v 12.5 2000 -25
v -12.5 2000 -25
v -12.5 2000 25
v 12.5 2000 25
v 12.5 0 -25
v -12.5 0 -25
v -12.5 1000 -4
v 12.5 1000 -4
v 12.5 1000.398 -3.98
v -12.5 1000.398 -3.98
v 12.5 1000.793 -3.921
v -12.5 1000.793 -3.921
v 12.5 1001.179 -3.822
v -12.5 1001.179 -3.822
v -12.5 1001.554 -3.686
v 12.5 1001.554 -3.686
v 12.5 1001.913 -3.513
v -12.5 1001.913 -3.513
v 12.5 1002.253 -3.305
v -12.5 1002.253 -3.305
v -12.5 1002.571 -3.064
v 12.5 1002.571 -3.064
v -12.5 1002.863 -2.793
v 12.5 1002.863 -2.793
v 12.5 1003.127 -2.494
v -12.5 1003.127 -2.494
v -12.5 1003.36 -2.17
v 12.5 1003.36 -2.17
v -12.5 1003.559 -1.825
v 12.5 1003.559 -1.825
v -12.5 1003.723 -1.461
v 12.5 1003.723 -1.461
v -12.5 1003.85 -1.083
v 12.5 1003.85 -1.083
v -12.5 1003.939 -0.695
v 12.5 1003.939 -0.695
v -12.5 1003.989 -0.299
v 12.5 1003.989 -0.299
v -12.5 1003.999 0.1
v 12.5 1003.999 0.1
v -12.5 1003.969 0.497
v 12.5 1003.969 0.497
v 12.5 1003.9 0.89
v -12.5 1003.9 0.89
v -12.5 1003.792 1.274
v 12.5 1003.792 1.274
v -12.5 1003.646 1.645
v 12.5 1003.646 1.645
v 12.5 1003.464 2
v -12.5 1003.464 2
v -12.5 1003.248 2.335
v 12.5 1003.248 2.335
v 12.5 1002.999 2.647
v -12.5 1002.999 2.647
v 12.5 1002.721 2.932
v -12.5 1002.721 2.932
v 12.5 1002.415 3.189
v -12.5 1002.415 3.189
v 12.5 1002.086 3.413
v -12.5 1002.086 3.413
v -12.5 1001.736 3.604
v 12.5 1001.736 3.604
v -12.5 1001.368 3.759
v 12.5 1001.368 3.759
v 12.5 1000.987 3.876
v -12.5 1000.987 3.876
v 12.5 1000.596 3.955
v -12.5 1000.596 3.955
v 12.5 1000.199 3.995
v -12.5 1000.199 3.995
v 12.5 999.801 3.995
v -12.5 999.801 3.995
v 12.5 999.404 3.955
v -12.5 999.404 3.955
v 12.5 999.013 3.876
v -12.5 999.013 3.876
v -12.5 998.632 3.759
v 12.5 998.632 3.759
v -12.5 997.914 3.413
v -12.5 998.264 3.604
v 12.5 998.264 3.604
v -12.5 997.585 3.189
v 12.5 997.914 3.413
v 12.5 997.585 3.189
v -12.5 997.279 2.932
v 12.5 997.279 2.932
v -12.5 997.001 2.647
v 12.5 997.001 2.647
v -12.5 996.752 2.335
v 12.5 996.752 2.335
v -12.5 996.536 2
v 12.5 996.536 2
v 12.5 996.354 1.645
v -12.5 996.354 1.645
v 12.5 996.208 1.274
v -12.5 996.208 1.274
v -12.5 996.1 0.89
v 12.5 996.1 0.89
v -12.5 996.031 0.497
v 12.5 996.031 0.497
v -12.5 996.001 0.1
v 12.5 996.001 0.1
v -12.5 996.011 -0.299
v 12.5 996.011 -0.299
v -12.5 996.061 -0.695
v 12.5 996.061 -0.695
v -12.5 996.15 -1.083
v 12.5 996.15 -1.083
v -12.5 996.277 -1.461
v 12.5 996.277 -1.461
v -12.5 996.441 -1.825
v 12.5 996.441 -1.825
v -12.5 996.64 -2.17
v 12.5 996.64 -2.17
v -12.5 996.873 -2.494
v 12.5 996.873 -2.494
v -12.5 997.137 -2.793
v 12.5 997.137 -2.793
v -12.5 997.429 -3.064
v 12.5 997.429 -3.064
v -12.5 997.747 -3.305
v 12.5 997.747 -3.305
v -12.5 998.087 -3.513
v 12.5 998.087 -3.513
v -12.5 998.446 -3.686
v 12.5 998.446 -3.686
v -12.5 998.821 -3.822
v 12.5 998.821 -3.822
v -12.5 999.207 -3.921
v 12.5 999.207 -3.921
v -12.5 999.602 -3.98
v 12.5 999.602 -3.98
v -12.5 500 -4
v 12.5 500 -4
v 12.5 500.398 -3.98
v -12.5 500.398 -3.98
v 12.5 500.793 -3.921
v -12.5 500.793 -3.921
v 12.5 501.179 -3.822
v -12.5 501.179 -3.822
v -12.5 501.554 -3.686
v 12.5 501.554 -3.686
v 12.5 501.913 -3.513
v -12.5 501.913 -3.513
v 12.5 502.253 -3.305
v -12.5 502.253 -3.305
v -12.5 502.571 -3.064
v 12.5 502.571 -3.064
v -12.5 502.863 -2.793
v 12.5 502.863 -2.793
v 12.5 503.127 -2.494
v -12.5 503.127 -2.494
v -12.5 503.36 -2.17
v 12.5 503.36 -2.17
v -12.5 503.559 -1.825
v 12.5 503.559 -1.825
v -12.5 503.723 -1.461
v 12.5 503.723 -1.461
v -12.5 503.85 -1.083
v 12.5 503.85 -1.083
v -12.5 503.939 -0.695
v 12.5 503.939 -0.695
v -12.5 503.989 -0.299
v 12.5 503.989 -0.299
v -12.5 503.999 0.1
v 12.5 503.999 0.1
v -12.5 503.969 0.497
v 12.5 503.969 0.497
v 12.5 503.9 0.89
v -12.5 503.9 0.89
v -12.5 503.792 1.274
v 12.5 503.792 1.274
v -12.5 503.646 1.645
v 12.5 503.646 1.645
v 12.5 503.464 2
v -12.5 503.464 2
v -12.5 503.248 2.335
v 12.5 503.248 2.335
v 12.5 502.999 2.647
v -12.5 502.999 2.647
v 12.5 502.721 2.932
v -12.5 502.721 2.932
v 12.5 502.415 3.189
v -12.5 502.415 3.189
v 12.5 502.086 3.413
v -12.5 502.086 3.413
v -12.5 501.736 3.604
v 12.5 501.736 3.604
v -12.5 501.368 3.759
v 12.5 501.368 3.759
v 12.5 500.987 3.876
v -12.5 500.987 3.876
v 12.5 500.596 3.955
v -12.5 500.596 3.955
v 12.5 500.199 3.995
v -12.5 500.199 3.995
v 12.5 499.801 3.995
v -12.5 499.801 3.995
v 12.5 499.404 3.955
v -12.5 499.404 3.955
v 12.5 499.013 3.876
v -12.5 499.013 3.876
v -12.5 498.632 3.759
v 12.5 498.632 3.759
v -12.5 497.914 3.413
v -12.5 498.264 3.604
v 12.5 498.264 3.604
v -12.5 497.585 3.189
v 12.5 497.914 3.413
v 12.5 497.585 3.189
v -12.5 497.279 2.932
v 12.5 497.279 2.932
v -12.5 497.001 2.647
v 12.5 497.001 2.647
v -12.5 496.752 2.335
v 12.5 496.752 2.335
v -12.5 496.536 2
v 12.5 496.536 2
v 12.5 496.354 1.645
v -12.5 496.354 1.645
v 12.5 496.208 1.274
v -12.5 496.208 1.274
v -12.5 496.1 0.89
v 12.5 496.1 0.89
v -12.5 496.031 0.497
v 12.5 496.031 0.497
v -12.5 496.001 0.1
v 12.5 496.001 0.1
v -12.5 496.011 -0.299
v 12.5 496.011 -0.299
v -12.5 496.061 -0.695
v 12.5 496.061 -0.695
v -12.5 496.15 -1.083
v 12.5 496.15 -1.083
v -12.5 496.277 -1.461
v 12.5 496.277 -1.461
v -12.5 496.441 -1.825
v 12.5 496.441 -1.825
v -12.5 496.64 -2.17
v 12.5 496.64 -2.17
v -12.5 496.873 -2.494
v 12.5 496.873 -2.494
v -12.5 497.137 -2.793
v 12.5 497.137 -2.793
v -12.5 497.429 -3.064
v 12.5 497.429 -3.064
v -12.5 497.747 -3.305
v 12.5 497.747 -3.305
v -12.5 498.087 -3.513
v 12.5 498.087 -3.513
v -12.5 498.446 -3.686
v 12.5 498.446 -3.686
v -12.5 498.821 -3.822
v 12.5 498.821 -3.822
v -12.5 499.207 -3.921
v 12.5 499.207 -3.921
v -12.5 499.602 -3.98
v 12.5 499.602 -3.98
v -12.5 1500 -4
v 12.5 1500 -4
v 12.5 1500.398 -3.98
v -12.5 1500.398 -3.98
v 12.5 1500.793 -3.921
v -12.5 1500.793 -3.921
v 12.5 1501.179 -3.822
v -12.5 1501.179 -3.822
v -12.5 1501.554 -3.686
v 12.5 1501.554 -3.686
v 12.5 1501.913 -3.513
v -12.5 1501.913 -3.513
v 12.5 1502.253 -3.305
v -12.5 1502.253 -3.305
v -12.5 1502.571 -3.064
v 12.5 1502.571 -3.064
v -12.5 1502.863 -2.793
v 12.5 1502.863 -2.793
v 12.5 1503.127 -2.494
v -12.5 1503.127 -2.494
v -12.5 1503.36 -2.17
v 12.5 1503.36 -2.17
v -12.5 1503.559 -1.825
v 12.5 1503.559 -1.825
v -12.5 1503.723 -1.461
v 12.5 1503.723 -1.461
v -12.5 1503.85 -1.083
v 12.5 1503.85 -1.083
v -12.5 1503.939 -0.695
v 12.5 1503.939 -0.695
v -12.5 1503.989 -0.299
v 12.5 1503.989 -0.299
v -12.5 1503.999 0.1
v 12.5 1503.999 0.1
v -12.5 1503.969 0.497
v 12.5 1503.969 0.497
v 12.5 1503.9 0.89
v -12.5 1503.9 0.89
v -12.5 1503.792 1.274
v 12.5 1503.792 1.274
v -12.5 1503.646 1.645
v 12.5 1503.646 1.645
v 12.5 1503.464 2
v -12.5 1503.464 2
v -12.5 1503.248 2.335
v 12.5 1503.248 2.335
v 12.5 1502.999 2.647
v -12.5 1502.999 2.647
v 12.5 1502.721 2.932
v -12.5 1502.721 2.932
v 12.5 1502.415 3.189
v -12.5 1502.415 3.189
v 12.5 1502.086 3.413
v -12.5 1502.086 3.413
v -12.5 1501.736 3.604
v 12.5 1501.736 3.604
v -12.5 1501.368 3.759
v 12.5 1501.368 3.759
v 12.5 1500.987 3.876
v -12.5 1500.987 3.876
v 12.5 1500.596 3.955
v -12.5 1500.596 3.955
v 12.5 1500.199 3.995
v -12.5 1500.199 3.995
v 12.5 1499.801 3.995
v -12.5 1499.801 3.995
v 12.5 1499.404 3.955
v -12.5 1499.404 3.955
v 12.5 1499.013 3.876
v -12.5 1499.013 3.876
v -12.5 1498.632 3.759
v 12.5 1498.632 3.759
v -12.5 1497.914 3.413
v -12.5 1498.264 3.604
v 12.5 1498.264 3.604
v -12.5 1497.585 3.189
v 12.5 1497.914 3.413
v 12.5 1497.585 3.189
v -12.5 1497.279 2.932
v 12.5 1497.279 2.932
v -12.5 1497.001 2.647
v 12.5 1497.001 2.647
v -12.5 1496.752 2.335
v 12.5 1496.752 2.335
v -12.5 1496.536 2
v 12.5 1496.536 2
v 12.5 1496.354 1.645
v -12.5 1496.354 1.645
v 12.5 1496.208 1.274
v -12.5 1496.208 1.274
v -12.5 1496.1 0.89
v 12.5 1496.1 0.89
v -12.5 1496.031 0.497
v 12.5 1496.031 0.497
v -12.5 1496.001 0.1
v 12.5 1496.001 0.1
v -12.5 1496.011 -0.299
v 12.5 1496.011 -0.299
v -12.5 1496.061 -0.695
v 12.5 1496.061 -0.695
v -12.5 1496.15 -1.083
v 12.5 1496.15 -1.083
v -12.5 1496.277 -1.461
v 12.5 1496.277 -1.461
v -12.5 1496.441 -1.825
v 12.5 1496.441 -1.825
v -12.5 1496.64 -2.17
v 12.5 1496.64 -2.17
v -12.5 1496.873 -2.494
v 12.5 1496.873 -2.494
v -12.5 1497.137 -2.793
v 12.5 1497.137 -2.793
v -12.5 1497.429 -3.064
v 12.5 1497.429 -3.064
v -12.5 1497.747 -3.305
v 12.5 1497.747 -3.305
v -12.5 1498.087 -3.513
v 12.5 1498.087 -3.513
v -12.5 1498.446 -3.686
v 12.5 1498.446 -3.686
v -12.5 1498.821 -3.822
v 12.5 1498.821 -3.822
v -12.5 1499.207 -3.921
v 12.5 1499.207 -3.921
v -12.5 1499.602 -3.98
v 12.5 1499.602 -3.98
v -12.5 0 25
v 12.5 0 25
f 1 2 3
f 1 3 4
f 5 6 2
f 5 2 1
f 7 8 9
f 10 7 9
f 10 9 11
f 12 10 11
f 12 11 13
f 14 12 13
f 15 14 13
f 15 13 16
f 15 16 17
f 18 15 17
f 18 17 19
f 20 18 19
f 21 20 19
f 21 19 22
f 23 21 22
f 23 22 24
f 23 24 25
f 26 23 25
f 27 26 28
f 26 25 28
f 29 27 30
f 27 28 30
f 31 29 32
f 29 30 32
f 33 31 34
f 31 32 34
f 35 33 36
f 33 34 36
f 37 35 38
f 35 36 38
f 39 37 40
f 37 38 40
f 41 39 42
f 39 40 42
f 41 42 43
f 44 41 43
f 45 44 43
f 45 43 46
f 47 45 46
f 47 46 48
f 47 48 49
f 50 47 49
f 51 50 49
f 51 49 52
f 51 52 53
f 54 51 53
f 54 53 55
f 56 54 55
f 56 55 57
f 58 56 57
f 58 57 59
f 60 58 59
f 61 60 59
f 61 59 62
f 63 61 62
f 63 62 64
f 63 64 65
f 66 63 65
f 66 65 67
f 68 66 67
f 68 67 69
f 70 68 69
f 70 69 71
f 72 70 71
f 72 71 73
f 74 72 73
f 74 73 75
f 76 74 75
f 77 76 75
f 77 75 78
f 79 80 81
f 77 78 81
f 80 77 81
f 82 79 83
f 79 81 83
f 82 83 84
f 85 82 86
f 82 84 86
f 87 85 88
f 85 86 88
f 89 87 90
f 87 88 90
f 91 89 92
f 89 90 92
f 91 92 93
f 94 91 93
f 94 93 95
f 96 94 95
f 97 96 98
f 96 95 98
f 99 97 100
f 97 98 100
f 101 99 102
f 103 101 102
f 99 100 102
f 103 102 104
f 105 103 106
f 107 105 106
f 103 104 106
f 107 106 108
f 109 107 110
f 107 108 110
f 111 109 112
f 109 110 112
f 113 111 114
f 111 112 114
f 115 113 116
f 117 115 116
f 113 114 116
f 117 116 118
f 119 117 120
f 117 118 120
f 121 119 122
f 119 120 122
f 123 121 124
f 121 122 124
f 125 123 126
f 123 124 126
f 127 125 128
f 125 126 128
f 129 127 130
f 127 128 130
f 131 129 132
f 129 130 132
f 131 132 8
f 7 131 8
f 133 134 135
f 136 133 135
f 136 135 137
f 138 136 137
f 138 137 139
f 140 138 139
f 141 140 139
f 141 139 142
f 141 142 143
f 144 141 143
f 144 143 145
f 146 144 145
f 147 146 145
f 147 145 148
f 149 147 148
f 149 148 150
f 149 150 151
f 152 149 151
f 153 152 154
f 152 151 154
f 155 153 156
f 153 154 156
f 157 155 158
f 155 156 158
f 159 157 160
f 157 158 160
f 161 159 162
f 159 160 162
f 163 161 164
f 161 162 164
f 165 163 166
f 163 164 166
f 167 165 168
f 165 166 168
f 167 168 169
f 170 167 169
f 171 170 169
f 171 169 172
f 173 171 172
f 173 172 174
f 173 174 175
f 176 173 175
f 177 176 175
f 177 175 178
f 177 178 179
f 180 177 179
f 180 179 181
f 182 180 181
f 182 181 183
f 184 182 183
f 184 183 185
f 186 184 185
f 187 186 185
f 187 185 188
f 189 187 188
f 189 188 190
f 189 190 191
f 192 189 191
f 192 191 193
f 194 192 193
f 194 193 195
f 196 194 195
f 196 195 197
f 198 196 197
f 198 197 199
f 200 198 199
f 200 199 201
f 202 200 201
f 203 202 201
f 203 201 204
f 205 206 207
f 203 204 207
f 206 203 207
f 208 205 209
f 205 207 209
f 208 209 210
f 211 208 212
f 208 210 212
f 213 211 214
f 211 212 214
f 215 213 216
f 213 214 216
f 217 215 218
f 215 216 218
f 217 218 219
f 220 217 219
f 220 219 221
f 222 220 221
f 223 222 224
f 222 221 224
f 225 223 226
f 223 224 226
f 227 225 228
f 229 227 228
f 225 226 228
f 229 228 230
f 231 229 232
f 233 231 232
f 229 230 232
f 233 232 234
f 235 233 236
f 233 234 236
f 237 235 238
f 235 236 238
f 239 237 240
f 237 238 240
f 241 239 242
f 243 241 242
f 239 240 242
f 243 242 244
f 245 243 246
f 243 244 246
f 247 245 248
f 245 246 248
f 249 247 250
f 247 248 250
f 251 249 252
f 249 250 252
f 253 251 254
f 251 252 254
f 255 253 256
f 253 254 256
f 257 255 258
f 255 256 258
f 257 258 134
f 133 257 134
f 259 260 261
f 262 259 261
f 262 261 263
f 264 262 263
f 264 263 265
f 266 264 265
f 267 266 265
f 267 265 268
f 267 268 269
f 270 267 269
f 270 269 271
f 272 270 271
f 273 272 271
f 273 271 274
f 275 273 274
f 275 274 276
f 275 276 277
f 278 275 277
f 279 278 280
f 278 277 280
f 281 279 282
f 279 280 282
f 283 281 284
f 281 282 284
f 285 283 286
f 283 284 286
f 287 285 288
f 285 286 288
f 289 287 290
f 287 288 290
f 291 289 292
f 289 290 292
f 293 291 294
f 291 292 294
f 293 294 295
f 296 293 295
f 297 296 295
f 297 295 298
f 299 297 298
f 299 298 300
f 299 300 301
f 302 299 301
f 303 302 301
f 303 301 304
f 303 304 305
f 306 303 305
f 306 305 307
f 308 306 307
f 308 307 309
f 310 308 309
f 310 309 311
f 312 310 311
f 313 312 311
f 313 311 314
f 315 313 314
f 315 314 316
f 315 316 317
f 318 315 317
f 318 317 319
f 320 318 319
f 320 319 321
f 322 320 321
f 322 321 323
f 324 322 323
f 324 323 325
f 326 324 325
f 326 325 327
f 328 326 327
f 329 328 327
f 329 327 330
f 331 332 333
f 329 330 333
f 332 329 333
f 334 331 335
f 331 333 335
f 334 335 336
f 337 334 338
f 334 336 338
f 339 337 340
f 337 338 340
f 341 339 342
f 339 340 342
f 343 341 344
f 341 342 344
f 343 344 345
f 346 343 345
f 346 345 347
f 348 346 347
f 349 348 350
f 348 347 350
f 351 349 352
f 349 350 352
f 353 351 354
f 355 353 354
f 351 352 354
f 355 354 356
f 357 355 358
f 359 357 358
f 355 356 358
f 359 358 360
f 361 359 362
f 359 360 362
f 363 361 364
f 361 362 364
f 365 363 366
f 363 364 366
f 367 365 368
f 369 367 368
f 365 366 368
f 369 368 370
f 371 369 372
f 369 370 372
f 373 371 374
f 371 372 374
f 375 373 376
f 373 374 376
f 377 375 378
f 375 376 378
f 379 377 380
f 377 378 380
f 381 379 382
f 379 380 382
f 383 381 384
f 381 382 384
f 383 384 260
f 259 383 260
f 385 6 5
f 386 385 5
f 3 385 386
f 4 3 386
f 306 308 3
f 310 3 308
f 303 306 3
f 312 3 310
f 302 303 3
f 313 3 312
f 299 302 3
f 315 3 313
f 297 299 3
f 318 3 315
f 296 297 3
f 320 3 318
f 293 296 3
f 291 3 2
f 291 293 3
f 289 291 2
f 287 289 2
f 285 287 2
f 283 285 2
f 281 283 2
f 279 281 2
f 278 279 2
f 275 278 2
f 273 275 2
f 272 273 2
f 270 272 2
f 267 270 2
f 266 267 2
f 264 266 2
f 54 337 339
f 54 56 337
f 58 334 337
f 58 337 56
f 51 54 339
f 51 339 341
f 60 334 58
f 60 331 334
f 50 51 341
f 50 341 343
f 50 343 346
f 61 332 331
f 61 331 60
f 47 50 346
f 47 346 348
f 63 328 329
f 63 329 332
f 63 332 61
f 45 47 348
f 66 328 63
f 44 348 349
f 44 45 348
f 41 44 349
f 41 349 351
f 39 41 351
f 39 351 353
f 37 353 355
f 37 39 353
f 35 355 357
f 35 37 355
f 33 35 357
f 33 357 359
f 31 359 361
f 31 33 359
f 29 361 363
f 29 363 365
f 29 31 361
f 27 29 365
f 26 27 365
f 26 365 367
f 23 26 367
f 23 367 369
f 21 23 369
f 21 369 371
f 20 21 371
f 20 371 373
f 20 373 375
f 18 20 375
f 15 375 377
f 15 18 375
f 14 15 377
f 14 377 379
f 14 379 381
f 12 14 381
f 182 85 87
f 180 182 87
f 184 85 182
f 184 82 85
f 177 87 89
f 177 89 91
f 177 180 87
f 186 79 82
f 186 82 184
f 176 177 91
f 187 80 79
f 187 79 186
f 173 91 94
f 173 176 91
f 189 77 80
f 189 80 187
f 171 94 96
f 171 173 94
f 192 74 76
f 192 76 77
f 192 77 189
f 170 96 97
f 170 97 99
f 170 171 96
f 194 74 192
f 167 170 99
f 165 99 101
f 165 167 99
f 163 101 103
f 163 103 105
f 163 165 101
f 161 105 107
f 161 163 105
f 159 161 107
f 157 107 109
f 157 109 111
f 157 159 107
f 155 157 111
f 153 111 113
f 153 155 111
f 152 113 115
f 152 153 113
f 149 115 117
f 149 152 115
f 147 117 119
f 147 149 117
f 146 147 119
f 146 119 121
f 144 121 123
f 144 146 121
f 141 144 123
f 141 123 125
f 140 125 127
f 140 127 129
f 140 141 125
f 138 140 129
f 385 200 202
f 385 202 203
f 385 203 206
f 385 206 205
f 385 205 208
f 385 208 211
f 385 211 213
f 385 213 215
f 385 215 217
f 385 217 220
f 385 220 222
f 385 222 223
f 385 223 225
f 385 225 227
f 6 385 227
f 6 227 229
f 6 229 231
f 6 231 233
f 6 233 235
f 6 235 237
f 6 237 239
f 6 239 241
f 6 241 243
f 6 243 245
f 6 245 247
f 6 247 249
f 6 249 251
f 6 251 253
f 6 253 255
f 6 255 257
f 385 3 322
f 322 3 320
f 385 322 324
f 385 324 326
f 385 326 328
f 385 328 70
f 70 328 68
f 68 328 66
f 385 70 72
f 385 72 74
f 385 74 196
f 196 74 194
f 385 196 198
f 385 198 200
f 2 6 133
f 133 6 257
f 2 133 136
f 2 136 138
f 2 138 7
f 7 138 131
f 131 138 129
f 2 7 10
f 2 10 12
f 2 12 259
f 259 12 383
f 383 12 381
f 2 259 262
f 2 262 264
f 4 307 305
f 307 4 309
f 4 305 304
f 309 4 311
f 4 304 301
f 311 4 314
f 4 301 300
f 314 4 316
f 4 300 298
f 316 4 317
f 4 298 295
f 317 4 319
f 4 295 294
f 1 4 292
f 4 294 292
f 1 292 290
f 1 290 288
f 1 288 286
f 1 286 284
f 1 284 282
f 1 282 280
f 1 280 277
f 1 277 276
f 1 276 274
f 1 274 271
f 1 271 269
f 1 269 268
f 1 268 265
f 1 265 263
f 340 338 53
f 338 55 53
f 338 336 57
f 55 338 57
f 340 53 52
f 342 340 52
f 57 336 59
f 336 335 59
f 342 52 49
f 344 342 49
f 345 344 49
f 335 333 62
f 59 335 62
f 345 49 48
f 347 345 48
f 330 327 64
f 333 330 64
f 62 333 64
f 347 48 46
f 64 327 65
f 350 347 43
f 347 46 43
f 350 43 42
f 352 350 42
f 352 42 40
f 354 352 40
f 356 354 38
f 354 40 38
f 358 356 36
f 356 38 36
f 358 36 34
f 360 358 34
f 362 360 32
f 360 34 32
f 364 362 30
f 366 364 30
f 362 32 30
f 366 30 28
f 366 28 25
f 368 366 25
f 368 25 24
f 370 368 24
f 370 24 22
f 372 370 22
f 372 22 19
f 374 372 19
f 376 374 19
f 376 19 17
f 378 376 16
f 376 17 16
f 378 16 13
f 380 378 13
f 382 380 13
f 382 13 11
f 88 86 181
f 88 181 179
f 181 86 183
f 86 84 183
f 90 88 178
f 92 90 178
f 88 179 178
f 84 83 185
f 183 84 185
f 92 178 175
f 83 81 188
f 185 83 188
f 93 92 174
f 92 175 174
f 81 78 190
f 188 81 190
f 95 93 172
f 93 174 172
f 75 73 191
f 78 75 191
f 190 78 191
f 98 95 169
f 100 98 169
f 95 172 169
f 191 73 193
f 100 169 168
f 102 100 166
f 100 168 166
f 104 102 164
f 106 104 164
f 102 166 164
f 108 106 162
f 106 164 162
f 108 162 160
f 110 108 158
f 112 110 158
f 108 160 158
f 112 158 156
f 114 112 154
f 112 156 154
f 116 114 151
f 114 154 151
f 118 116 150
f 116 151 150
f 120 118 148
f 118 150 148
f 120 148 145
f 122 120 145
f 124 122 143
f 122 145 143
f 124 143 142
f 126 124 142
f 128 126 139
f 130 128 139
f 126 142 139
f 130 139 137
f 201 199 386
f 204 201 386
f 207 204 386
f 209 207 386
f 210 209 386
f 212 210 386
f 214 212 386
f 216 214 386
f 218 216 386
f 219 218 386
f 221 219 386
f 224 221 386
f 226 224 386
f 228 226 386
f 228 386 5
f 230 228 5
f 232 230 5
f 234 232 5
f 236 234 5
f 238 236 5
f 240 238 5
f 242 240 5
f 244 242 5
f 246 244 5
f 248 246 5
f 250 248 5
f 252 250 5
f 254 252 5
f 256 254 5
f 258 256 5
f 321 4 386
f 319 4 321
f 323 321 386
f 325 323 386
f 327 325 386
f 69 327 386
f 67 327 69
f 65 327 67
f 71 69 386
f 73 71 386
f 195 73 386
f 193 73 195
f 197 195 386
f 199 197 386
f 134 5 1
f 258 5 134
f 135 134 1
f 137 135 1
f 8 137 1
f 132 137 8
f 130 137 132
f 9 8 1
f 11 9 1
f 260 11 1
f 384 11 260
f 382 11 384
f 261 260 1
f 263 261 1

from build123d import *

# Parameters (mm, degrees)
SKETCH_1_W          = 25
SKETCH_1_H          = 50
EXTRUDE_1_DEPTH     = 2000
SKETCH_2_R          = 4
CUT_EXTRUDE_1_DEPTH = 2214.15898255
SKETCH_3_R          = 4
CUT_EXTRUDE_2_DEPTH = 50


with BuildPart() as part:
    # Эскиз1 → Бобышка-Вытянуть1 (new body)
    with BuildSketch(Plane(origin=(0, 0, 0), x_dir=(1, 0, 0), z_dir=(0, 1, 0))):
        Rectangle(SKETCH_1_W, SKETCH_1_H)
    extrude(amount=EXTRUDE_1_DEPTH)

    # Эскиз2 → Вырез-Вытянуть1 (cut)
    with BuildSketch(Plane(origin=(12.5, 0, 0), x_dir=(0, 0, -1), z_dir=(1, 0, 0))):
        with Locations((0, 1500)):
            Circle(SKETCH_2_R)
        with Locations((0, 500)):
            Circle(SKETCH_2_R)
    extrude(amount=-CUT_EXTRUDE_1_DEPTH, mode=Mode.SUBTRACT)

    # Эскиз3 → Вырез-Вытянуть2 (cut)
    with BuildSketch(Plane(origin=(12.5, 0, 0), x_dir=(0, 0, -1), z_dir=(1, 0, 0))):
        with Locations((0, 1000)):
            Circle(SKETCH_3_R)
    extrude(amount=-CUT_EXTRUDE_2_DEPTH, mode=Mode.SUBTRACT)


solid = part.part
